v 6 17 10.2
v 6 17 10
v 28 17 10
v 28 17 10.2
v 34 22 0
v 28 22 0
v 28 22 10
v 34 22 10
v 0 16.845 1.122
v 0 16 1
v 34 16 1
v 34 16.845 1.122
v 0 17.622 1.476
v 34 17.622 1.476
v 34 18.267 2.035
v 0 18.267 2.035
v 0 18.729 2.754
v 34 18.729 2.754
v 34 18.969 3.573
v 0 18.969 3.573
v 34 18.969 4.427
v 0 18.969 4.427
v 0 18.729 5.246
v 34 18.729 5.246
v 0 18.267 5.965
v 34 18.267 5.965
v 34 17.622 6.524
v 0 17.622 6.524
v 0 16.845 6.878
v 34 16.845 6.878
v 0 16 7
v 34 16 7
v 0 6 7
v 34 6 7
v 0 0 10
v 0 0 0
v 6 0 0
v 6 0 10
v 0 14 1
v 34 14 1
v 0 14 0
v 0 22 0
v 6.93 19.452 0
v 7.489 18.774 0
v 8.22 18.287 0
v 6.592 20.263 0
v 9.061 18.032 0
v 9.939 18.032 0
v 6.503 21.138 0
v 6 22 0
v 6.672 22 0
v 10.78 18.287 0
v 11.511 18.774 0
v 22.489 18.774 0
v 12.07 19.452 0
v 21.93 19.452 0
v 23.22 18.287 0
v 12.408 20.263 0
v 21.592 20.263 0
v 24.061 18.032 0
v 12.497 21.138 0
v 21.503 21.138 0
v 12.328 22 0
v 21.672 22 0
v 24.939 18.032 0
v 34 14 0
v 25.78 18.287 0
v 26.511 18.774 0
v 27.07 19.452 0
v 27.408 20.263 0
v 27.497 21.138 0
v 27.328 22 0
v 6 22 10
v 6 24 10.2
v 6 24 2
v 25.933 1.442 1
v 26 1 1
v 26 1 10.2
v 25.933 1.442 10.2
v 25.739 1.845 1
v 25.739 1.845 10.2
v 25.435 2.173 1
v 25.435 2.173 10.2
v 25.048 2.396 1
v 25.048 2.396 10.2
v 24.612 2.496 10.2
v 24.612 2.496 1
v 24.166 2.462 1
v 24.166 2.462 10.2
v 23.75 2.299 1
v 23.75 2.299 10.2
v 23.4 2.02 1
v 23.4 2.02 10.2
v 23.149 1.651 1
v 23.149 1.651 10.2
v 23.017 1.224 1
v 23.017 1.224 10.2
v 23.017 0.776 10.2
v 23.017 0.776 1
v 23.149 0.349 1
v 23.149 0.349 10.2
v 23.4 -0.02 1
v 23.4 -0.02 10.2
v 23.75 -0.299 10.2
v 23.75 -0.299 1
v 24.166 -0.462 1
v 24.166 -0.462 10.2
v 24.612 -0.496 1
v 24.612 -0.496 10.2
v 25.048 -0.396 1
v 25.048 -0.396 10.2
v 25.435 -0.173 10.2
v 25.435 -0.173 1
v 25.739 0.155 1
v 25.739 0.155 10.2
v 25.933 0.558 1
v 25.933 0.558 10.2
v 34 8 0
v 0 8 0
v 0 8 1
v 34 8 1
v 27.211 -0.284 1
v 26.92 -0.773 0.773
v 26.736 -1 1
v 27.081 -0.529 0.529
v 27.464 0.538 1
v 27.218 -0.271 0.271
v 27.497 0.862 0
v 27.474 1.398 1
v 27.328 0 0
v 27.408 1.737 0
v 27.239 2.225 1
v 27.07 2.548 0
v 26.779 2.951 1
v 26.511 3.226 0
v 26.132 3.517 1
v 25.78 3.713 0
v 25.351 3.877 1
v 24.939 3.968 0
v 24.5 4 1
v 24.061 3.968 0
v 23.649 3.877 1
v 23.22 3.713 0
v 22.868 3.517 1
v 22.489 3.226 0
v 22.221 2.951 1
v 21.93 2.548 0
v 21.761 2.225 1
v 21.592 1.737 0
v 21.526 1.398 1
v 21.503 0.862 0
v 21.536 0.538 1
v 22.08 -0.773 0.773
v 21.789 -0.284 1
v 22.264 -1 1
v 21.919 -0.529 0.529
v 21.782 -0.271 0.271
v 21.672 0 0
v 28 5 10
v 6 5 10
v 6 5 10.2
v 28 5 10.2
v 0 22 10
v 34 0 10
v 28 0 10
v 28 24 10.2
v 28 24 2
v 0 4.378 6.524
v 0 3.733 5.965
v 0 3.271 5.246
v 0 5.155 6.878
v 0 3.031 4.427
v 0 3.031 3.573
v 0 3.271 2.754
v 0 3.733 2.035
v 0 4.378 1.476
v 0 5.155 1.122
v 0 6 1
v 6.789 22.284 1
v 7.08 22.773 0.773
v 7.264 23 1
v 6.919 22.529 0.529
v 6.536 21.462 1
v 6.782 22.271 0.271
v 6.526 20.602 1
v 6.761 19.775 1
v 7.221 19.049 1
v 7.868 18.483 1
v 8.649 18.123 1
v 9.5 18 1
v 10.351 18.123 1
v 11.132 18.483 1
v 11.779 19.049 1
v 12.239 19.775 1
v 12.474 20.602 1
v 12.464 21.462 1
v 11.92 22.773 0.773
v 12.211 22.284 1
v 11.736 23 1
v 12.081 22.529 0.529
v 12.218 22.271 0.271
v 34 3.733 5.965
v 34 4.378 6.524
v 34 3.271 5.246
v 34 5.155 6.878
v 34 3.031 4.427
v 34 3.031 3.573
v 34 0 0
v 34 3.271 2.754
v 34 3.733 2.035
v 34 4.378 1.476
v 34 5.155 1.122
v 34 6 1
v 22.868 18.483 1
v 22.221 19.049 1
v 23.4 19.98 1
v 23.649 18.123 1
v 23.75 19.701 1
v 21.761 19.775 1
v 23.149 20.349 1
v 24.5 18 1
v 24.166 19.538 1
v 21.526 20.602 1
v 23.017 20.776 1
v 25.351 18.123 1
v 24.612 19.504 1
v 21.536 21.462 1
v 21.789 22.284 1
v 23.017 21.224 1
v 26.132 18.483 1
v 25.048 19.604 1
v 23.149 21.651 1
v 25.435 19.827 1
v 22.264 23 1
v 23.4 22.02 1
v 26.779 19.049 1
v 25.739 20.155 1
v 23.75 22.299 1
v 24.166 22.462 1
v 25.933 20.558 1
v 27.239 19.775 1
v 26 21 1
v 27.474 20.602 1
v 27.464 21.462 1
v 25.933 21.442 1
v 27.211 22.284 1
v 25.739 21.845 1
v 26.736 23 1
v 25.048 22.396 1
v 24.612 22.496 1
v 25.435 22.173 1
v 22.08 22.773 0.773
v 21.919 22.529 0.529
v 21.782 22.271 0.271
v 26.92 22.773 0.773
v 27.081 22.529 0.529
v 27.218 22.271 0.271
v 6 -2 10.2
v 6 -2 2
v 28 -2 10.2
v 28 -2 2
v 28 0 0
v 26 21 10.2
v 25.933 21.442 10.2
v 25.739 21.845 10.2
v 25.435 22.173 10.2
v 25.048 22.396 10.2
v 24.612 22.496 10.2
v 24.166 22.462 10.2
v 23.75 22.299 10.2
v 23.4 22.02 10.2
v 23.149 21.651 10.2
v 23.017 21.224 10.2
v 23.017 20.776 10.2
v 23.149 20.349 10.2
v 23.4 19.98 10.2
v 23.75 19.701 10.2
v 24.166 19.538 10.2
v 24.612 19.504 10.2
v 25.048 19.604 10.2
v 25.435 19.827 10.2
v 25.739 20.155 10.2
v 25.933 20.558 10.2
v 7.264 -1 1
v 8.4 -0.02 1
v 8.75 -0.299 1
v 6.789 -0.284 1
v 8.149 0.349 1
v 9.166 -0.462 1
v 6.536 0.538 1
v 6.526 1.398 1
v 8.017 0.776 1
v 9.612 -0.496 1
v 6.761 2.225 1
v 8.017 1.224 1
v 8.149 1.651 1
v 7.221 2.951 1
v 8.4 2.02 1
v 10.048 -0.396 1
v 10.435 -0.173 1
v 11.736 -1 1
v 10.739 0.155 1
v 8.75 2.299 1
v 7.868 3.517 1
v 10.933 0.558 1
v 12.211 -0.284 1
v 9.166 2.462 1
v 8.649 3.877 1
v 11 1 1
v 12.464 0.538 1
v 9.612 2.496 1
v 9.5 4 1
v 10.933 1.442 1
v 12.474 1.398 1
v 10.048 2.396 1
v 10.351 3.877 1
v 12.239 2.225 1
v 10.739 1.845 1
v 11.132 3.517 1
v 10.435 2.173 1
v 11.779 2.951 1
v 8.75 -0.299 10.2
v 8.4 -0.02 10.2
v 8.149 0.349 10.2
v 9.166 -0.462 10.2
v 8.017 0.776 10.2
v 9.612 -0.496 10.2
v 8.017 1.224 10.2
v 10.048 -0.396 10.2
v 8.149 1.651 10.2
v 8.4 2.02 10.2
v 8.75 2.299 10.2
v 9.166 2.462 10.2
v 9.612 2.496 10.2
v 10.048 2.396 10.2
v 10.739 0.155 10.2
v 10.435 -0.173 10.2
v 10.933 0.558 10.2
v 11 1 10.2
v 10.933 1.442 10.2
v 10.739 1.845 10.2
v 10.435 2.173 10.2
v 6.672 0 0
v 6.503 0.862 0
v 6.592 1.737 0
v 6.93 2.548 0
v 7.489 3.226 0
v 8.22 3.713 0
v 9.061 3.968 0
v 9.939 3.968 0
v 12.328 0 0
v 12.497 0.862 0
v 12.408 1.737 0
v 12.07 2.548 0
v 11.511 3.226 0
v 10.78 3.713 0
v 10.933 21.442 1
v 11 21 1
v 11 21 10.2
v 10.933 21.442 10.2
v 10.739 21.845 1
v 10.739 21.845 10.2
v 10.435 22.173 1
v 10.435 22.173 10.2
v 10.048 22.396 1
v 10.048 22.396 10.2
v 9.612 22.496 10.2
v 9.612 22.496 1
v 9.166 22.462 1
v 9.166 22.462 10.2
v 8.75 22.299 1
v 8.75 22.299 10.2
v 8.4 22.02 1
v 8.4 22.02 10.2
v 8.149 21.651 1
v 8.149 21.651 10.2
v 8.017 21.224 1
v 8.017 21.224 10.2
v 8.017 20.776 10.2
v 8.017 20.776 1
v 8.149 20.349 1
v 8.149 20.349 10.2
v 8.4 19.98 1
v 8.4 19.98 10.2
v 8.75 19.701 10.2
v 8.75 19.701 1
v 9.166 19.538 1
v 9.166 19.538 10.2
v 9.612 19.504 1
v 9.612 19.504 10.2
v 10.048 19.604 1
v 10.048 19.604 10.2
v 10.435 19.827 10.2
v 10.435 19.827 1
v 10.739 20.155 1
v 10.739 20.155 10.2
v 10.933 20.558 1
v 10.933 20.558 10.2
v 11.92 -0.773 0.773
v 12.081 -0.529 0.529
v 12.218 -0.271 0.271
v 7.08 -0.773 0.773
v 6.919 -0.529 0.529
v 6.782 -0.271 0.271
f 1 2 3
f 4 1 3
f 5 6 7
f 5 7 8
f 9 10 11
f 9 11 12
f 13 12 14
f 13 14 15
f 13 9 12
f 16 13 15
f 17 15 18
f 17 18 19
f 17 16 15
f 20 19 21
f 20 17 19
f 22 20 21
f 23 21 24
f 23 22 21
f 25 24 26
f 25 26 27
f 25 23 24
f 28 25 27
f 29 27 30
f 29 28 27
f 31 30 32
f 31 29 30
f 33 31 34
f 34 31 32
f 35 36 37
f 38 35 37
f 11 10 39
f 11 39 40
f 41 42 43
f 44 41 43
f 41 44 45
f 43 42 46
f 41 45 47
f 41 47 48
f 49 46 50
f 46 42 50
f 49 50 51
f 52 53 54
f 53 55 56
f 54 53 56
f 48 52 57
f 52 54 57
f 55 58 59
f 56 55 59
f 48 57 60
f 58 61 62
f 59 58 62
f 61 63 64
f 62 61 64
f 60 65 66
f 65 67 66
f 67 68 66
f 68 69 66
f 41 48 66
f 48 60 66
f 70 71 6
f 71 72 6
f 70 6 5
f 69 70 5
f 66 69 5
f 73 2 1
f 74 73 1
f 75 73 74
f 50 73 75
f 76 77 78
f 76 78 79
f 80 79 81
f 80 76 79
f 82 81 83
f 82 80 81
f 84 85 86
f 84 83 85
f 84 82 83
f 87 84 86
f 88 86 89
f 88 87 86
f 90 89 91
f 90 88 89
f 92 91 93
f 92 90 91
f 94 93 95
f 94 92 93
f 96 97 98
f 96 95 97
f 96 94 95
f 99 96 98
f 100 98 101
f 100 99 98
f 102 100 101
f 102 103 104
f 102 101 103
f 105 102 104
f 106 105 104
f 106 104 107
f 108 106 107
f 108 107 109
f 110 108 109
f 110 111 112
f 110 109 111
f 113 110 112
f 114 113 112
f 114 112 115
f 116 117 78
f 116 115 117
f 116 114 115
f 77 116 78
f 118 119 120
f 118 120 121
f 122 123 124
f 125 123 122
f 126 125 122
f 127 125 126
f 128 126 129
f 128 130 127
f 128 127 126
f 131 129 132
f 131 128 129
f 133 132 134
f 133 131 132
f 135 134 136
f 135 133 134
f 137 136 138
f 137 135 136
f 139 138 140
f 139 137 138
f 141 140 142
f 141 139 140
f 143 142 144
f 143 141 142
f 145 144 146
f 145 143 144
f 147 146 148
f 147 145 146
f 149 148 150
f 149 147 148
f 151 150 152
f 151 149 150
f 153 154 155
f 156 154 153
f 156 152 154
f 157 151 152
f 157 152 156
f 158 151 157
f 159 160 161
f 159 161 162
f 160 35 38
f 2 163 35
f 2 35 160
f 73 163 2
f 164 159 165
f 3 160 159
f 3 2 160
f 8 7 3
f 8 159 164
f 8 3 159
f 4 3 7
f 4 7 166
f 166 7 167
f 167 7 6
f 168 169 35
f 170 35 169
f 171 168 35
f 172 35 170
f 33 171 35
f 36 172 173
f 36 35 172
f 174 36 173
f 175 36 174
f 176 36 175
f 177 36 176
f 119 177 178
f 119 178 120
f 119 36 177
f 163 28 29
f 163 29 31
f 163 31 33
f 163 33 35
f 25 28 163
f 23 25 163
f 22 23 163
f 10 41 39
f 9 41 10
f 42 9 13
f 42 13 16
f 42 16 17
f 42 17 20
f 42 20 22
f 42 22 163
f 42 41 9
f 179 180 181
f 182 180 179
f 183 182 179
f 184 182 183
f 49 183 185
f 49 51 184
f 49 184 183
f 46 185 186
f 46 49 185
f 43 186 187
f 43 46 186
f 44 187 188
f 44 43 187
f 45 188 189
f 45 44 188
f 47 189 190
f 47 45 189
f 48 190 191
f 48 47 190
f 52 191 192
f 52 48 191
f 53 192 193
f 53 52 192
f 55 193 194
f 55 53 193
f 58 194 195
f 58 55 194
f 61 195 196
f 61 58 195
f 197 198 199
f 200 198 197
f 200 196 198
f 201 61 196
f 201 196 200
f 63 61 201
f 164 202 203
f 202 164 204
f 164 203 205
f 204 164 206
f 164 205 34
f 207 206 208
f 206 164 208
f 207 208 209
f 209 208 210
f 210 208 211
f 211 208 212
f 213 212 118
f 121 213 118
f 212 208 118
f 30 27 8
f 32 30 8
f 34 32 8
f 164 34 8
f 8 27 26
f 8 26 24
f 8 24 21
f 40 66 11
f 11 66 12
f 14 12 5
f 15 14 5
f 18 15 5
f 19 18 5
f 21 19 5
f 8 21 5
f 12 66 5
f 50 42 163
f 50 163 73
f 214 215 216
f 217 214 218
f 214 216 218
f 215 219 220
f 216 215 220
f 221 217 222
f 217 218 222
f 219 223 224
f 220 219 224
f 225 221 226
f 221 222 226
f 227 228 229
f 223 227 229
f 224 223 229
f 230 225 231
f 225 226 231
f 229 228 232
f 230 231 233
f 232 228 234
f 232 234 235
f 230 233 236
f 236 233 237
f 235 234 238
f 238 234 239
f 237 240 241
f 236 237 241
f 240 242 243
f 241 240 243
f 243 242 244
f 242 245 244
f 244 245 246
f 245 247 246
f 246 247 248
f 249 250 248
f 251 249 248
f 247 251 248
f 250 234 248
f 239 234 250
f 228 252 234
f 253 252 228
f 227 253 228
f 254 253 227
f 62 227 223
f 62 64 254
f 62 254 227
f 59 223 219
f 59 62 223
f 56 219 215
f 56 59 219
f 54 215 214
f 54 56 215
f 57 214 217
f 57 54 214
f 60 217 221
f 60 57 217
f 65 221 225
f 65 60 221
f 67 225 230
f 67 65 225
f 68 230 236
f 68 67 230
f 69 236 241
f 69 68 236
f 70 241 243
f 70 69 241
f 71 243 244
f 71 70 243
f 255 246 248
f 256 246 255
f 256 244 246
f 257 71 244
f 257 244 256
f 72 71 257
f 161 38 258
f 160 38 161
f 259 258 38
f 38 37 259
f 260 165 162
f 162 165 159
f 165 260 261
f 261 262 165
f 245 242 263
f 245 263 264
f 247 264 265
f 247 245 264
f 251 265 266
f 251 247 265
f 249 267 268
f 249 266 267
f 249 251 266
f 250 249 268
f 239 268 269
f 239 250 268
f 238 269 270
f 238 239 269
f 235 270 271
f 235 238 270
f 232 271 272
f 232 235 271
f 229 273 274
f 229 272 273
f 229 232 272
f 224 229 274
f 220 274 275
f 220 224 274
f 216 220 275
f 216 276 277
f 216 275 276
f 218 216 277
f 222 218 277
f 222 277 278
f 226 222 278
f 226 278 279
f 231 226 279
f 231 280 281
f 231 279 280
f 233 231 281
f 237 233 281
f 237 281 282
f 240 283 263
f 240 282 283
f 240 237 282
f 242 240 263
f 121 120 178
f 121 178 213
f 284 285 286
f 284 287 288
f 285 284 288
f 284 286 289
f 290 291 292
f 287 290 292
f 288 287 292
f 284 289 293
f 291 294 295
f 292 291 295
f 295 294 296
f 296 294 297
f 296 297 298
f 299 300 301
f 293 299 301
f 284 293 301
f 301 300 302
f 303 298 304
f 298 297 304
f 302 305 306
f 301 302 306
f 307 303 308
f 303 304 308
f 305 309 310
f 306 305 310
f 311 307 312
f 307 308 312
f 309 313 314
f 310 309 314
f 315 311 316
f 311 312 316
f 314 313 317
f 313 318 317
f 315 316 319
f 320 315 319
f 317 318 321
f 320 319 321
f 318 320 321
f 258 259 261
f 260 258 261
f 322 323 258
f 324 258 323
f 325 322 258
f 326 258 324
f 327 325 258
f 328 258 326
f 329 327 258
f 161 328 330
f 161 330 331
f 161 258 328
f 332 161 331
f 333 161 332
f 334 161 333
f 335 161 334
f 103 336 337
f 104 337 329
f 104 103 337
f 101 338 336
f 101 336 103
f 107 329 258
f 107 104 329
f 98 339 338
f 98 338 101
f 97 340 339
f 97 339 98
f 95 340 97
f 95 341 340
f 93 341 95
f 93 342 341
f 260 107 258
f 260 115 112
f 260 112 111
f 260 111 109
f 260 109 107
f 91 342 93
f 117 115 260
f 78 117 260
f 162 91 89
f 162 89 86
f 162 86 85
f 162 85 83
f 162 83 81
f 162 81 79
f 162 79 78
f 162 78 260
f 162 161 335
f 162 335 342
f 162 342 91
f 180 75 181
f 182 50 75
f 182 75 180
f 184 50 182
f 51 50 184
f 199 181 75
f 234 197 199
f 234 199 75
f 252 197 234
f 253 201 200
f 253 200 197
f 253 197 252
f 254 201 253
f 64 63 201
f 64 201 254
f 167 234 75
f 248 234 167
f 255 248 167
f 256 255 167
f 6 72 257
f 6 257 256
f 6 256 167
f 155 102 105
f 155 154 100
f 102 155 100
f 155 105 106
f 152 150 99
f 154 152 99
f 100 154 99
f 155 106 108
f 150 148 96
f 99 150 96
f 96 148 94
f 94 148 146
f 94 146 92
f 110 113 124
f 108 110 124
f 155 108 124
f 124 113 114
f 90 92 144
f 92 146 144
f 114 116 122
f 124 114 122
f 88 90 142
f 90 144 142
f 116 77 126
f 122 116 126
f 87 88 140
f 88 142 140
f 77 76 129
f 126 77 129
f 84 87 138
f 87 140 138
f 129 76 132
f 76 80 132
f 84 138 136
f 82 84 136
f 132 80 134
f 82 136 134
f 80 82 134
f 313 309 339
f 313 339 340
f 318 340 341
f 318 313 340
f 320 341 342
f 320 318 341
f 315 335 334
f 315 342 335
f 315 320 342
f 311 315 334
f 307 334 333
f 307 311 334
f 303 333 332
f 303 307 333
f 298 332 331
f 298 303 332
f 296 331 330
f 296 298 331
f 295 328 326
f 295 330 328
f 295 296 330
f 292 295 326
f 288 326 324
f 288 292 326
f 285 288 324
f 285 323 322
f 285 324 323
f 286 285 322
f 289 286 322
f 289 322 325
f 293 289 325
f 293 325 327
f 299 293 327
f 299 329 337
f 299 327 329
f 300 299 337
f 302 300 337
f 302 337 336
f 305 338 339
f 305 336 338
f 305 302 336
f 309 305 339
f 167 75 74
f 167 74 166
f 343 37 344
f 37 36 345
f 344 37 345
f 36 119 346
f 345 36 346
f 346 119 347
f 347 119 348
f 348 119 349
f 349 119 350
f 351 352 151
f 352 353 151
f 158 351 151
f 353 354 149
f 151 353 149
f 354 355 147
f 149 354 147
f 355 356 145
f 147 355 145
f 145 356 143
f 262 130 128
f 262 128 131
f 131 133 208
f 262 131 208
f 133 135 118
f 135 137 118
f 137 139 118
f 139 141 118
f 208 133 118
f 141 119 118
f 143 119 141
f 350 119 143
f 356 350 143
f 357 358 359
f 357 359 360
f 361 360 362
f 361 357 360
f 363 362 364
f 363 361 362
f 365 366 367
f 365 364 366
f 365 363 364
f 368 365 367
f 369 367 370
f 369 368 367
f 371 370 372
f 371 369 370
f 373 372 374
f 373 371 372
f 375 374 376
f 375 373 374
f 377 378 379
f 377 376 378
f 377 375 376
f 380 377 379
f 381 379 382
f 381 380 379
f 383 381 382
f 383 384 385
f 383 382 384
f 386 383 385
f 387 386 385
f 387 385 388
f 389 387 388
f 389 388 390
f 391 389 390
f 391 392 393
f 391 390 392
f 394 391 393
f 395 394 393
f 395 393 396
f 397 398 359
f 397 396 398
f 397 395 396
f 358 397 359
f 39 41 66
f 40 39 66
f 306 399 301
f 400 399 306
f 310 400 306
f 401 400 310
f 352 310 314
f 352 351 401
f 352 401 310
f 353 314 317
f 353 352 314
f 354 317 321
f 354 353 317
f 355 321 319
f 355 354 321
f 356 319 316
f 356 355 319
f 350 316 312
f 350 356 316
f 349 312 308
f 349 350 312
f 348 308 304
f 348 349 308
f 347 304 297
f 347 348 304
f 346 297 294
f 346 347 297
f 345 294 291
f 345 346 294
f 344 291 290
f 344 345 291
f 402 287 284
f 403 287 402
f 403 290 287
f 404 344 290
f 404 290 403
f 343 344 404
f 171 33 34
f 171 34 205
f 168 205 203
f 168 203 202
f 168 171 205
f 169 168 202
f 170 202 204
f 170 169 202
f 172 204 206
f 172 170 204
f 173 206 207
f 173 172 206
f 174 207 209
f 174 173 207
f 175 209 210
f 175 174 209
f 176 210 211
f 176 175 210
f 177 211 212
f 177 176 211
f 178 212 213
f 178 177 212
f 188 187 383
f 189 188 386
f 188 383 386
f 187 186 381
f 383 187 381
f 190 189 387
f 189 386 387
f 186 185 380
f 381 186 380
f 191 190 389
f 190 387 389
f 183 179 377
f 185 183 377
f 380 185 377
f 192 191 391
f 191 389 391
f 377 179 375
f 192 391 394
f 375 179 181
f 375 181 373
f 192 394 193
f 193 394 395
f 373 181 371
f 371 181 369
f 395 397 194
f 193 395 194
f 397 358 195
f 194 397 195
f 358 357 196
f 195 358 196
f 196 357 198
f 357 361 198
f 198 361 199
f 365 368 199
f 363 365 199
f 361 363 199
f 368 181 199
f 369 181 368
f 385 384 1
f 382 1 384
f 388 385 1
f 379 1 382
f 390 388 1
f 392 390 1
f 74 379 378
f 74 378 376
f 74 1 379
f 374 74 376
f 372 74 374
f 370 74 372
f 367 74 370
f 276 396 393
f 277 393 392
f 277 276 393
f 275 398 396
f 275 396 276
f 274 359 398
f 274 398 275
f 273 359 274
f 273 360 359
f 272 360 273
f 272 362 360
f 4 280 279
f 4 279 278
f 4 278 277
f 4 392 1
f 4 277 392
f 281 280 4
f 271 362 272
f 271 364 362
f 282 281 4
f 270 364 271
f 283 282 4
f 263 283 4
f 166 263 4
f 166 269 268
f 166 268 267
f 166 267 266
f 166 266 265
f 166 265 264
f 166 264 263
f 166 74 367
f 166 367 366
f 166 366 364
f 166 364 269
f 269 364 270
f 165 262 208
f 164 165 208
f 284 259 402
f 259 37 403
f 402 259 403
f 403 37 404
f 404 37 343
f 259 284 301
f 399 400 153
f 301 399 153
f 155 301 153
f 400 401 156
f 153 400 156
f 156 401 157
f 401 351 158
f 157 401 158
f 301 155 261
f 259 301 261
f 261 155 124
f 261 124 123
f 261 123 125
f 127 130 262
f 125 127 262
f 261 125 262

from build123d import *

# Parameters (mm, degrees)
BOX003_W                = 34
BOX003_H                = 10
BOX003_DEPTH            = 6
CYLINDER006_R           = 3
CYLINDER006_DEPTH       = 34
CYLINDER006_PITCH_ANGLE = 90
BOX004_W                = 34
BOX004_H                = 6
BOX004_DEPTH            = 1
CYLINDER005_R           = 3
CYLINDER005_DEPTH       = 34
CYLINDER005_PITCH_ANGLE = 90
CYLINDER008_R           = 3
CYLINDER008_DEPTH       = 1
CYLINDER004_R           = 1.5
CYLINDER004_DEPTH       = 11
CYLINDER009_R           = 3
CYLINDER009_DEPTH       = 1
CYLINDER003_R           = 1.5
CYLINDER003_DEPTH       = 11
CYLINDER010_R           = 3
CYLINDER010_DEPTH       = 1
CYLINDER002_R           = 1.5
CYLINDER002_DEPTH       = 11
CYLINDER007_R           = 3
CYLINDER007_DEPTH       = 1
CYLINDER001_R           = 1.5
CYLINDER001_DEPTH       = 11
BOX001_W                = 22
BOX001_H                = 7
BOX001_DEPTH            = 10.2
CHAMFER_SIZE            = 2
BOX002_W                = 22
BOX002_H                = 7
BOX002_DEPTH            = 10.2
CHAMFER001_SIZE         = 2
BOX_W                   = 34
BOX_H                   = 22
BOX_DEPTH               = 10


with BuildPart() as cube003:
    # Box003 → Box003 (new body)
    with BuildSketch(Plane(origin=(0, 6, 1), x_dir=(1, 0, 0), z_dir=(0, 0, 1))):
        with Locations((17, 5)):
            Rectangle(BOX003_W, BOX003_H)
    extrude(amount=BOX003_DEPTH)


with BuildPart() as cylinder006:
    # Cylinder006 → Cylinder006 (new body)
    with BuildSketch(Plane.XY):
        Circle(CYLINDER006_R)
    extrude(amount=CYLINDER006_DEPTH)


with BuildPart() as cylinder006_1:
    # Cylinder006 pitch: moved
    add(cylinder006.part.rotate(Axis((0, 0, 0), (0, 1, 0)), CYLINDER006_PITCH_ANGLE))


with BuildPart() as cylinder006_2:
    # Cylinder006 placement: moved
    add(cylinder006_1.part.moved(Location((0, 16, 4))))


with BuildPart() as cube004:
    # Box004 → Box004 (new body)
    with BuildSketch(Plane(origin=(0, 8, 0), x_dir=(1, 0, 0), z_dir=(0, 0, 1))):
        with Locations((17, 3)):
            Rectangle(BOX004_W, BOX004_H)
    extrude(amount=BOX004_DEPTH)


with BuildPart() as fusion005:
    # Cylinder005 → Cylinder005 (new body)
    with BuildSketch(Plane.XY):
        Circle(CYLINDER005_R)
    extrude(amount=CYLINDER005_DEPTH)


with BuildPart() as fusion005_1:
    # Cylinder005 pitch: moved
    add(fusion005.part.rotate(Axis((0, 0, 0), (0, 1, 0)), CYLINDER005_PITCH_ANGLE))


with BuildPart() as fusion005_2:
    # Cylinder005 placement: moved
    add(fusion005_1.part.moved(Location((0, 6, 4))))

    # Fusion005: union Cube003, Cylinder006, Cube004
    add(cube003.part)
    add(cylinder006_2.part)
    add(cube004.part)


with BuildPart() as cylinder008:
    # Cylinder008 → Cylinder008 (new body)
    with BuildSketch(Plane(origin=(25, 1.5, 0), x_dir=(1, 0, 0), z_dir=(0, 0, 1))):
        Circle(CYLINDER008_R)
    extrude(amount=CYLINDER008_DEPTH)


with BuildPart() as fusion004:
    # Cylinder004 → Cylinder004 (new body)
    with BuildSketch(Plane(origin=(25, 1.5, 0), x_dir=(1, 0, 0), z_dir=(0, 0, 1))):
        Circle(CYLINDER004_R)
    extrude(amount=CYLINDER004_DEPTH)

    # Fusion004: union Cylinder008
    add(cylinder008.part)


with BuildPart() as fusion004_1:
    # Fusion004 placement: moved
    add(fusion004.part.moved(Location((-0.5, -0.5, 0))))


with BuildPart() as cylinder009:
    # Cylinder009 → Cylinder009 (new body)
    with BuildSketch(Plane(origin=(9, 20.5, 0), x_dir=(1, 0, 0), z_dir=(0, 0, 1))):
        Circle(CYLINDER009_R)
    extrude(amount=CYLINDER009_DEPTH)


with BuildPart() as fusion003:
    # Cylinder003 → Cylinder003 (new body)
    with BuildSketch(Plane(origin=(9, 20.5, 0), x_dir=(1, 0, 0), z_dir=(0, 0, 1))):
        Circle(CYLINDER003_R)
    extrude(amount=CYLINDER003_DEPTH)

    # Fusion003: union Cylinder009
    add(cylinder009.part)


with BuildPart() as fusion003_1:
    # Fusion003 placement: moved
    add(fusion003.part.moved(Location((0.5, 0.5, 0))))


with BuildPart() as cylinder010:
    # Cylinder010 → Cylinder010 (new body)
    with BuildSketch(Plane(origin=(25, 20.5, 0), x_dir=(1, 0, 0), z_dir=(0, 0, 1))):
        Circle(CYLINDER010_R)
    extrude(amount=CYLINDER010_DEPTH)


with BuildPart() as fusion002:
    # Cylinder002 → Cylinder002 (new body)
    with BuildSketch(Plane(origin=(25, 20.5, 0), x_dir=(1, 0, 0), z_dir=(0, 0, 1))):
        Circle(CYLINDER002_R)
    extrude(amount=CYLINDER002_DEPTH)

    # Fusion002: union Cylinder010
    add(cylinder010.part)


with BuildPart() as fusion002_1:
    # Fusion002 placement: moved
    add(fusion002.part.moved(Location((-0.5, 0.5, 0))))


with BuildPart() as cylinder007:
    # Cylinder007 → Cylinder007 (new body)
    with BuildSketch(Plane(origin=(9, 1.5, 0), x_dir=(1, 0, 0), z_dir=(0, 0, 1))):
        Circle(CYLINDER007_R)
    extrude(amount=CYLINDER007_DEPTH)


with BuildPart() as fusion001:
    # Cylinder001 → Cylinder001 (new body)
    with BuildSketch(Plane(origin=(9, 1.5, 0), x_dir=(1, 0, 0), z_dir=(0, 0, 1))):
        Circle(CYLINDER001_R)
    extrude(amount=CYLINDER001_DEPTH)

    # Fusion001: union Cylinder007
    add(cylinder007.part)


with BuildPart() as fusion001_1:
    # Fusion001 placement: moved
    add(fusion001.part.moved(Location((0.5, -0.5, 0))))


with BuildPart() as chamfer_body:
    # Box001 → Box001 (new body)
    with BuildSketch(Plane(origin=(6, -2, 0), x_dir=(1, 0, 0), z_dir=(0, 0, 1))):
        with Locations((11, 3.5)):
            Rectangle(BOX001_W, BOX001_H)
    extrude(amount=BOX001_DEPTH)

    # Chamfer
    chamfer_edges = [chamfer_body.edges().sort_by_distance(p)[0] for p in [
        (17, -2, 0),
    ]]
    chamfer(chamfer_edges, length=CHAMFER_SIZE)


with BuildPart() as chamfer001:
    # Box002 → Box002 (new body)
    with BuildSketch(Plane(origin=(6, 17, 0), x_dir=(1, 0, 0), z_dir=(0, 0, 1))):
        with Locations((11, 3.5)):
            Rectangle(BOX002_W, BOX002_H)
    extrude(amount=BOX002_DEPTH)

    # Chamfer001
    chamfer001_edges = [chamfer001.edges().sort_by_distance(p)[0] for p in [
        (17, 24, 0),
    ]]
    chamfer(chamfer001_edges, length=CHAMFER001_SIZE)


with BuildPart() as do_not_print_igus_slider:
    # Box → Box (new body)
    with BuildSketch(Plane.XY):
        with Locations((17, 11)):
            Rectangle(BOX_W, BOX_H)
    extrude(amount=BOX_DEPTH)

    # Fusion: union Chamfer body, Chamfer001
    add(chamfer_body.part)
    add(chamfer001.part)

    # Cut: cut Fusion001
    add(fusion001_1.part, mode=Mode.SUBTRACT)

    # Cut001: cut Fusion002
    add(fusion002_1.part, mode=Mode.SUBTRACT)

    # Cut002: cut Fusion003
    add(fusion003_1.part, mode=Mode.SUBTRACT)

    # Cut003: cut Fusion004
    add(fusion004_1.part, mode=Mode.SUBTRACT)

    # Cut004: cut Fusion005
    add(fusion005_2.part, mode=Mode.SUBTRACT)


solid = do_not_print_igus_slider.part
